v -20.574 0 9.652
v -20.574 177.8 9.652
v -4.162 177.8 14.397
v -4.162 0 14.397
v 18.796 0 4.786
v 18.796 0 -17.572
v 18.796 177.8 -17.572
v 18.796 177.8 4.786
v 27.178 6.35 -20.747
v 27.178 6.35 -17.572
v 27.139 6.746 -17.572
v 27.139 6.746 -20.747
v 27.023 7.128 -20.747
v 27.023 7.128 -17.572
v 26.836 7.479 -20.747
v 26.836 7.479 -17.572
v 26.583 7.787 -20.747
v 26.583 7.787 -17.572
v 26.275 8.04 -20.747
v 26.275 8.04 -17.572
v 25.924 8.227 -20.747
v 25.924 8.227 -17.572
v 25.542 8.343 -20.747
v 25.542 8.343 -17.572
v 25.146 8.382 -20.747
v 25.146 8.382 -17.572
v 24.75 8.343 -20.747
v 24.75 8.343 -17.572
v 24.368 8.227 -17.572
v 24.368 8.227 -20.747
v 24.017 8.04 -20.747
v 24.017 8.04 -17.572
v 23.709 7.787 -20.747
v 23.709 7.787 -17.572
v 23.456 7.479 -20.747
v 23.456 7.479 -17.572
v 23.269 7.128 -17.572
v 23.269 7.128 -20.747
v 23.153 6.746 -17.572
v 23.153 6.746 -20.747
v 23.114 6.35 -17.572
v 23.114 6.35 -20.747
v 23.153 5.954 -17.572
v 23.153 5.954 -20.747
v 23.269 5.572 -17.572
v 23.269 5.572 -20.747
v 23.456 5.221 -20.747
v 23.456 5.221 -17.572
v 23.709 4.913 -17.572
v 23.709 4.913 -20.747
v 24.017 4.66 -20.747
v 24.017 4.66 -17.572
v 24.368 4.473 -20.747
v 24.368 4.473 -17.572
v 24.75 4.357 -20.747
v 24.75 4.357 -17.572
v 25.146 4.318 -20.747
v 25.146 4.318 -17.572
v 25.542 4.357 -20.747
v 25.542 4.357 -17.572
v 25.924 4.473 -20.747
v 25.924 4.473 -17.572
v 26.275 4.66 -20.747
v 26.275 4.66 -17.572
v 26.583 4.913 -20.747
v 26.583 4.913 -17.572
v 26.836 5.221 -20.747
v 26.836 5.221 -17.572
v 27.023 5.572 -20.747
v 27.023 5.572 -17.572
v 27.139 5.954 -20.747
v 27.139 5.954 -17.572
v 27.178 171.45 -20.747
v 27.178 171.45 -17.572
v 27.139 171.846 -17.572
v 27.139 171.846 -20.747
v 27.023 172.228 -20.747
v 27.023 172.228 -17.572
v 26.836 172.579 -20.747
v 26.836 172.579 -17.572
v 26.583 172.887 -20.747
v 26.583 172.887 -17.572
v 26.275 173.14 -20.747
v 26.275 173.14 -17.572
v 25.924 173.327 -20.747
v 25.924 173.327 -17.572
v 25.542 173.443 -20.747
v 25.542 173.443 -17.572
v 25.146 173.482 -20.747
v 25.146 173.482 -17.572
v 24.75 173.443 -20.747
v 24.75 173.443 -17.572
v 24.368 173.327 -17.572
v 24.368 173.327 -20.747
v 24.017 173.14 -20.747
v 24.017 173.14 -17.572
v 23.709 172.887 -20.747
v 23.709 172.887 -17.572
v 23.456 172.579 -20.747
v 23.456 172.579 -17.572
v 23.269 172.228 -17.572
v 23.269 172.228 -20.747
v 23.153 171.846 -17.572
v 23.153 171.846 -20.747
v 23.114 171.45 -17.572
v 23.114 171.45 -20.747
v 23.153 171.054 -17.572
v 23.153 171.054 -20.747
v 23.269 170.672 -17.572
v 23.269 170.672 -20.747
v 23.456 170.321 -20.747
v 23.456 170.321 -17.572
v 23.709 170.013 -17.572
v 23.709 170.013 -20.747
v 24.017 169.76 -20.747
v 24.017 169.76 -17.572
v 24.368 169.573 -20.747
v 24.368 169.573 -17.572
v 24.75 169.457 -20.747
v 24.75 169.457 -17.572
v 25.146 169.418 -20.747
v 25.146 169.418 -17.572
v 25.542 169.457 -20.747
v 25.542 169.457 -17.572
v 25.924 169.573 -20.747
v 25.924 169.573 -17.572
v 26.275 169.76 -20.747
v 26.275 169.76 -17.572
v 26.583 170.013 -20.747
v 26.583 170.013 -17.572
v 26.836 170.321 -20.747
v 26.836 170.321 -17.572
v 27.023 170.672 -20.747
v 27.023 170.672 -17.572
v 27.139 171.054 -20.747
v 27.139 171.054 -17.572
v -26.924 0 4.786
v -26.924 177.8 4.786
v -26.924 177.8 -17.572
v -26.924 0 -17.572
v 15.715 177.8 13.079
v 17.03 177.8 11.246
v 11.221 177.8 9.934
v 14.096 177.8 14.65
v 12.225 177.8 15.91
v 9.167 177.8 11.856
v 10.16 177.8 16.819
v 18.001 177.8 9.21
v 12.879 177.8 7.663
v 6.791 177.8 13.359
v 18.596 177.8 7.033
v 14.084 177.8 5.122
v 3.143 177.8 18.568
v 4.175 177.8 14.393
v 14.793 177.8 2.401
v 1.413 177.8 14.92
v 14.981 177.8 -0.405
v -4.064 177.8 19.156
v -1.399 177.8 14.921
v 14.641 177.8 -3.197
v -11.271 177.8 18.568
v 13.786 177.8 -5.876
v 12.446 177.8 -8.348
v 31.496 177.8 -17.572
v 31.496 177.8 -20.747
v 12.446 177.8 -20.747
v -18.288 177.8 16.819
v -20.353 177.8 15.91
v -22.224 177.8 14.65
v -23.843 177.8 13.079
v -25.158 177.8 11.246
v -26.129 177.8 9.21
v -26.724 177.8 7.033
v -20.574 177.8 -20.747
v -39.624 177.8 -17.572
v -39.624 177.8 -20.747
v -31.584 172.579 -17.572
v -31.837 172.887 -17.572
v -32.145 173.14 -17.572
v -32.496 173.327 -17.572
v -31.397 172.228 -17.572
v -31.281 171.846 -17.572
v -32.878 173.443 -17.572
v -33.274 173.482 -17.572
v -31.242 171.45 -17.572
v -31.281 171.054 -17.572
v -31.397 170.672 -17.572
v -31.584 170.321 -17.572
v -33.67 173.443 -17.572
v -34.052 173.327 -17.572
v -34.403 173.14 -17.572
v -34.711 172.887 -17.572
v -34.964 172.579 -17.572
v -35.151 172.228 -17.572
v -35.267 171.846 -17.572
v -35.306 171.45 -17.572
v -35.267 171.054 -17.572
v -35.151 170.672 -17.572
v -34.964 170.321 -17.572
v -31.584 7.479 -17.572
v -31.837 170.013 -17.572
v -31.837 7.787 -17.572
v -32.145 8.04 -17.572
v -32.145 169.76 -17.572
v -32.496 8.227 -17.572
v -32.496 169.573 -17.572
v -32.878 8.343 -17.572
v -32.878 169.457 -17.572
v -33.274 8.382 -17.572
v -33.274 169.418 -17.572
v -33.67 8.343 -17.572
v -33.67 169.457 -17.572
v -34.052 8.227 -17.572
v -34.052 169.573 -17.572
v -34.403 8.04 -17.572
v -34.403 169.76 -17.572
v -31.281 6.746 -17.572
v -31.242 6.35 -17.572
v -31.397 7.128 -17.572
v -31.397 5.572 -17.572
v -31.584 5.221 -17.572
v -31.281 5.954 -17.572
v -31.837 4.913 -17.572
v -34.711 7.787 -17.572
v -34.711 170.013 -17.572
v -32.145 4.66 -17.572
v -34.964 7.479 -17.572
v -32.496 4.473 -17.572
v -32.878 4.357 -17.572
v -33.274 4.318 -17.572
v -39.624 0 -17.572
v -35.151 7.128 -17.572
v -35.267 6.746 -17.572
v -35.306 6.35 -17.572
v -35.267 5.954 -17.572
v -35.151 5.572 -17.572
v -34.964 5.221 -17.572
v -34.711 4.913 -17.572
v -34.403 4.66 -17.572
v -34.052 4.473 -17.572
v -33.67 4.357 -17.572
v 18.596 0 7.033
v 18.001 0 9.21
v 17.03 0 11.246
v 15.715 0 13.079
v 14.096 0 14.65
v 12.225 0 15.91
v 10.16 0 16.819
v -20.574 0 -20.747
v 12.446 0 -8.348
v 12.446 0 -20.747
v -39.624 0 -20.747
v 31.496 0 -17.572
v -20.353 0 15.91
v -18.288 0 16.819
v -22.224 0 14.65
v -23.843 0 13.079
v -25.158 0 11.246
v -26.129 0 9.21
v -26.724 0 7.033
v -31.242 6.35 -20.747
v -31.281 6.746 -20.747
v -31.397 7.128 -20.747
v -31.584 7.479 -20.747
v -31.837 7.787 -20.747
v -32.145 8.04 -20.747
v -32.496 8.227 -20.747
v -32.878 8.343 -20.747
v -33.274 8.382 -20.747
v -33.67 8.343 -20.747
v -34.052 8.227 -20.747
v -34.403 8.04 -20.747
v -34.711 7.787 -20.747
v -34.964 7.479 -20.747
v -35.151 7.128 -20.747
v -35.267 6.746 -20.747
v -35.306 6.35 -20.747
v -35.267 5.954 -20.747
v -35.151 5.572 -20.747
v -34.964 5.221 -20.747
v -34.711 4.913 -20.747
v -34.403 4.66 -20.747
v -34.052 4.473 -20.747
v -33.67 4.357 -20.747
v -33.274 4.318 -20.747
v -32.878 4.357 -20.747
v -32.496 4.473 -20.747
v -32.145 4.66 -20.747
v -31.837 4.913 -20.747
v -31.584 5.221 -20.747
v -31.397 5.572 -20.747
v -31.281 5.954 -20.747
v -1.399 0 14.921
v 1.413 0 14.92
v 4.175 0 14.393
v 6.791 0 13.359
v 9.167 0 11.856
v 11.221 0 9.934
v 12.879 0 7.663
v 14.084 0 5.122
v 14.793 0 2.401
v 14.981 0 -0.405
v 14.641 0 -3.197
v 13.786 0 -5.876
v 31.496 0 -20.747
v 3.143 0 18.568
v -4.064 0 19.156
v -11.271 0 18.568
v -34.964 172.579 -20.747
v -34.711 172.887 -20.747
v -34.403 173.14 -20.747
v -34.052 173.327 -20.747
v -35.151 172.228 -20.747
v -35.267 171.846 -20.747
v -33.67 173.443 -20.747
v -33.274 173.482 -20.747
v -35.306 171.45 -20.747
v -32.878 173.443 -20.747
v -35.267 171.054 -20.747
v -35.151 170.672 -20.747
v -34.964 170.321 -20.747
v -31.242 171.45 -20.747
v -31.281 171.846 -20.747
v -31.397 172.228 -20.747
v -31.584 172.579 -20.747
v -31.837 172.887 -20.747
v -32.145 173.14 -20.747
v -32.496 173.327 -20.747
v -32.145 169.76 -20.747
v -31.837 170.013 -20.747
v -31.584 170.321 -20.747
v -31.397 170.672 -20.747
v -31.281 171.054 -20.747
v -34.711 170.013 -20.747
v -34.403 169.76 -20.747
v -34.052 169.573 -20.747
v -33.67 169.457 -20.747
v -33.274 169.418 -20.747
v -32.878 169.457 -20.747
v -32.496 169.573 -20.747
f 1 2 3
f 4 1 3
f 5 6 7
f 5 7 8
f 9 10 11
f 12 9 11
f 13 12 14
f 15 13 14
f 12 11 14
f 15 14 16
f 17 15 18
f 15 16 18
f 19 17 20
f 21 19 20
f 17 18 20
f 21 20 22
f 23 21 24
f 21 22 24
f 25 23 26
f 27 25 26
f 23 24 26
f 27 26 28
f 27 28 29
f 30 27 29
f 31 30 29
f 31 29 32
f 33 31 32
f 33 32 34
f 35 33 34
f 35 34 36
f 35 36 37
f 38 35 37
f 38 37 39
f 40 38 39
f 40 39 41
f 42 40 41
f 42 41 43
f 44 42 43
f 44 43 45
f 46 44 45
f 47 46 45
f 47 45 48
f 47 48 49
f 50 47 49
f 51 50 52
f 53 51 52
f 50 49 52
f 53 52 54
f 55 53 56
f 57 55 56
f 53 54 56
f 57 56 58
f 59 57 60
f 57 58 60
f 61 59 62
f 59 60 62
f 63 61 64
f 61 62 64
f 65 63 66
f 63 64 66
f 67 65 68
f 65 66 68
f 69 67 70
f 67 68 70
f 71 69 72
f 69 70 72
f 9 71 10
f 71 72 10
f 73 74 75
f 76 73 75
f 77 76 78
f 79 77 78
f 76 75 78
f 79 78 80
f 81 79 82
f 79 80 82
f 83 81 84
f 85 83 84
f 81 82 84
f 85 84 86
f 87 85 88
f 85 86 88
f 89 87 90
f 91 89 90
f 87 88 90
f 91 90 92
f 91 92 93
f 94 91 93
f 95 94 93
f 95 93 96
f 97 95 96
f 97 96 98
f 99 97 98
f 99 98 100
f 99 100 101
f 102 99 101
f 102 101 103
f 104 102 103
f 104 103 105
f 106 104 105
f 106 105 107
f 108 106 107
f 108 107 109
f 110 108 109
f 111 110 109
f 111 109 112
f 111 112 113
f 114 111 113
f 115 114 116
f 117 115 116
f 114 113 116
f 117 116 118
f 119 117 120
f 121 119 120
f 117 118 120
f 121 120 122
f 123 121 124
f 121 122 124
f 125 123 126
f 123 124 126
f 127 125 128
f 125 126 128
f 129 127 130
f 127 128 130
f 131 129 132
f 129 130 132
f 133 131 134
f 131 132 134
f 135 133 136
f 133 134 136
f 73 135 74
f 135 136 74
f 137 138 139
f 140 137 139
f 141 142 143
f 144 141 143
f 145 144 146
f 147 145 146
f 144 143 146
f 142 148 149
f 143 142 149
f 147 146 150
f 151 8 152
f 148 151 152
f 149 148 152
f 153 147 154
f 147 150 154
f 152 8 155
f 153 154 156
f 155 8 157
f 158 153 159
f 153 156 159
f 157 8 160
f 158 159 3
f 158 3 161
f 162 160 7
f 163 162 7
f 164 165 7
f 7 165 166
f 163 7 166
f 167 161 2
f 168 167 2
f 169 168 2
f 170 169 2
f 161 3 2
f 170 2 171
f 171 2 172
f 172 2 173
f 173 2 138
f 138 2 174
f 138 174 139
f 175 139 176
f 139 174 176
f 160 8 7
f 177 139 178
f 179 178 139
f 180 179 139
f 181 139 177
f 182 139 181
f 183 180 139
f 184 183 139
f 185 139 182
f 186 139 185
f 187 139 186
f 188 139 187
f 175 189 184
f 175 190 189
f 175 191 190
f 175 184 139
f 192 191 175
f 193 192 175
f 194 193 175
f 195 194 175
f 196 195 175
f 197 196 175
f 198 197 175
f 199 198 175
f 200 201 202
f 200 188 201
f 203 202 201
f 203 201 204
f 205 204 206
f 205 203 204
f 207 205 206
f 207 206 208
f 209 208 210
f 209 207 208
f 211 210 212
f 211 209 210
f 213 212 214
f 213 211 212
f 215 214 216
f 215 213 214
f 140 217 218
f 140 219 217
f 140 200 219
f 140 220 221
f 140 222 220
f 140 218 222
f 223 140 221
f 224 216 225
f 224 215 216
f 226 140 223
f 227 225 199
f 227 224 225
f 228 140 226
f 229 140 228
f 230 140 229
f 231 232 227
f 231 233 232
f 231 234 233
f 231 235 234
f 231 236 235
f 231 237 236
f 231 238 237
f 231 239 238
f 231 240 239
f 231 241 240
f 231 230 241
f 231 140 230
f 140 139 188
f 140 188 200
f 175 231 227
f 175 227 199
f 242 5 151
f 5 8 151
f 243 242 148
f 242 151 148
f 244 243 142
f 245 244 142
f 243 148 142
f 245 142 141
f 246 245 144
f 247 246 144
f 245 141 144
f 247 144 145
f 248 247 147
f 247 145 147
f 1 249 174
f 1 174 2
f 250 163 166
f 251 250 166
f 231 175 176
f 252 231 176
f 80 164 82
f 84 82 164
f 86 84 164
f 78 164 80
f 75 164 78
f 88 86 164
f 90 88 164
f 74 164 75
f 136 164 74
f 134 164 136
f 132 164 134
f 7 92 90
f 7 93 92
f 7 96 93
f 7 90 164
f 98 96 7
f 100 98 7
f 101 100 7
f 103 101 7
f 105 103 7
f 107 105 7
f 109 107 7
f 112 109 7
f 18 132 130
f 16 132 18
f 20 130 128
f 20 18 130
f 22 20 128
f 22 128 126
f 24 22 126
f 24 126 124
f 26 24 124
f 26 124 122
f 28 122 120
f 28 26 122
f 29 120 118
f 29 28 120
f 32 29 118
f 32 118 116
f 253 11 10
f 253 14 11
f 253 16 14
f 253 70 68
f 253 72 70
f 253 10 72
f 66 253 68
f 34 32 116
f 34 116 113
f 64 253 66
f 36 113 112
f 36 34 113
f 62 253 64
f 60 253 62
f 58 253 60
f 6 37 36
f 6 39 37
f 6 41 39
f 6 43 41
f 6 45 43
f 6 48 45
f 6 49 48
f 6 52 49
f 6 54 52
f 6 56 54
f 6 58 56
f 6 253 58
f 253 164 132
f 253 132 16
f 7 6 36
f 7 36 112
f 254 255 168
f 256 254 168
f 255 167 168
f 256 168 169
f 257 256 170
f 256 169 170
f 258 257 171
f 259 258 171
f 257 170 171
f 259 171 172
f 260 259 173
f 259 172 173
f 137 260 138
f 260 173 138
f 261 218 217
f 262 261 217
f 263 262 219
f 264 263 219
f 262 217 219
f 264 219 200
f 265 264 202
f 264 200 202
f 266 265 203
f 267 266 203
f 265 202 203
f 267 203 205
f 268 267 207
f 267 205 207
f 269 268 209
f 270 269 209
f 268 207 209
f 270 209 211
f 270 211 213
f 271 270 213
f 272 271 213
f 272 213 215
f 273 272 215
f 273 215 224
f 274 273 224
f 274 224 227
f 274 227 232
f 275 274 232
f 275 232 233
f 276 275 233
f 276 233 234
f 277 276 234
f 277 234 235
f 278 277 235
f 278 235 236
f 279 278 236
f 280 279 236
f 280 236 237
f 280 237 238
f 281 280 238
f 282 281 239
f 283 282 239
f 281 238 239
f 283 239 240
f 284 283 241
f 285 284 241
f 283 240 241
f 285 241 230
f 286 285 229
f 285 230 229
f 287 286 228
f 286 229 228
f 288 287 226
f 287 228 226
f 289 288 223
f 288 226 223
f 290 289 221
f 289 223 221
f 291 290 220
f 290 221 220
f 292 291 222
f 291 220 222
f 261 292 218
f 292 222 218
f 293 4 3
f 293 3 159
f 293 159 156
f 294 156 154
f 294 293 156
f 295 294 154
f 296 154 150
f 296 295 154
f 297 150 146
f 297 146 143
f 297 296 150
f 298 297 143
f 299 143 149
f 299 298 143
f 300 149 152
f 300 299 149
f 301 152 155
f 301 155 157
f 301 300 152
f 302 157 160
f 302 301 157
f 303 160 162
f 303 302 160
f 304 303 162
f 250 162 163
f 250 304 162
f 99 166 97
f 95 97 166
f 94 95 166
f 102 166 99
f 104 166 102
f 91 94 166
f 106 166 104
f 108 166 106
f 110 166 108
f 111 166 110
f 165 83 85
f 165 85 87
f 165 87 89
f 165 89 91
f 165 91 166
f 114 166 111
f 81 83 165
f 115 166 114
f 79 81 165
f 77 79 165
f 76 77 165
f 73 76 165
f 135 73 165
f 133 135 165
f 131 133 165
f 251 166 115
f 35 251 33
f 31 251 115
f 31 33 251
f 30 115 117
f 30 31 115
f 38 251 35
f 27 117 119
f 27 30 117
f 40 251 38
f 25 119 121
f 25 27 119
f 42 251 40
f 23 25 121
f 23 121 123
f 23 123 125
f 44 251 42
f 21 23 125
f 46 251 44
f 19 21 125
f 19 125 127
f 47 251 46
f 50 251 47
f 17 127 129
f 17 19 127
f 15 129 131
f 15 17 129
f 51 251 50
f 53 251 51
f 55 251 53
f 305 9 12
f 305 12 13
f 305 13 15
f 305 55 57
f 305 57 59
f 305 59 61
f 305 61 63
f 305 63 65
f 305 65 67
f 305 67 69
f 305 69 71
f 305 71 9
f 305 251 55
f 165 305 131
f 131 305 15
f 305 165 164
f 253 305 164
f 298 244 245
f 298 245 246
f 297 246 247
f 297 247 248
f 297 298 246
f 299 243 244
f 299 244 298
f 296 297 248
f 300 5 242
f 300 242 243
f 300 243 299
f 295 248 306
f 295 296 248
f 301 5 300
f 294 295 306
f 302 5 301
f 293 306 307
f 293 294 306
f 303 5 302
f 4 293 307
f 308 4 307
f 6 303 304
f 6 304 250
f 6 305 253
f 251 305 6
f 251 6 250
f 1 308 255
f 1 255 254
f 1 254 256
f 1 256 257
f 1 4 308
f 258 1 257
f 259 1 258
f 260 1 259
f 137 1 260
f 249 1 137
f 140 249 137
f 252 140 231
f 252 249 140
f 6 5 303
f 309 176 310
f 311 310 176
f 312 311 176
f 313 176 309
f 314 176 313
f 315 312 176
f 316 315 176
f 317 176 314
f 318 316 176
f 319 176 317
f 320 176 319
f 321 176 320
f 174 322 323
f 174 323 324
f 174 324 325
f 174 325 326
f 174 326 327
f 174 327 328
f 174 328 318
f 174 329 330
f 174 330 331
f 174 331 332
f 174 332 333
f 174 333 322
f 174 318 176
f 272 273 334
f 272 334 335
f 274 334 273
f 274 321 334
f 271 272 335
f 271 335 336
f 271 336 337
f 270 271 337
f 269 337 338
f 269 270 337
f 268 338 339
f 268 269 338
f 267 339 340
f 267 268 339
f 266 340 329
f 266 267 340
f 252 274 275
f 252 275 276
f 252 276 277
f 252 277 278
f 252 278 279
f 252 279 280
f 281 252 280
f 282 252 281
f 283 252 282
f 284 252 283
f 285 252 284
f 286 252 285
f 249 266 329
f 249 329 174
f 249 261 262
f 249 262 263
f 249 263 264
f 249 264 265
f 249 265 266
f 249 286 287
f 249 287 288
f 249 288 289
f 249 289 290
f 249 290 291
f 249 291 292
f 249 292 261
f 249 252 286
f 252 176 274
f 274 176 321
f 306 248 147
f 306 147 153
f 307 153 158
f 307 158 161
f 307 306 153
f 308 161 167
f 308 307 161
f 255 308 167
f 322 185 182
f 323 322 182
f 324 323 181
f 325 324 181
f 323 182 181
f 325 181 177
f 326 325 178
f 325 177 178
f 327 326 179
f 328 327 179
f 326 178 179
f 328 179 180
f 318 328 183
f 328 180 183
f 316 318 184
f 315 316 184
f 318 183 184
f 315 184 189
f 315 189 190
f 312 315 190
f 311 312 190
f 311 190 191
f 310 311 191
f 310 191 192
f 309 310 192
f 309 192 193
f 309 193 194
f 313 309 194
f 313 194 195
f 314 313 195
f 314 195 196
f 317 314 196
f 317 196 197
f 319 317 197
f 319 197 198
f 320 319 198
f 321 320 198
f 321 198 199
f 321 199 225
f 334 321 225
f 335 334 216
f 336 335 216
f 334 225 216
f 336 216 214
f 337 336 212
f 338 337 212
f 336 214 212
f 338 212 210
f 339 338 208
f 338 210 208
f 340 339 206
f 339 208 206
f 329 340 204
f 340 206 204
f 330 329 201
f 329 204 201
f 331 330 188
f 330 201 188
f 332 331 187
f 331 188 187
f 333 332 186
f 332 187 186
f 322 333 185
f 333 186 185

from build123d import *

# Parameters (mm, degrees)
BOSS_EXTRUDE1_DEPTH = 177.8
SKETCH2_R           = 2.032
CUT_EXTRUDE1_DEPTH  = 186.827403736
FILLET2_R           = 12.7


with BuildPart() as part:
    # Sketch1 → Boss-Extrude1 (new body)
    with BuildSketch(Plane(origin=(0, 0, 0), x_dir=(1, 0, 0), z_dir=(0, 1, 0))):
        with BuildLine():
            Line((-20.574, -9.652129604), (-4.162019583, -14.39674322))
            ThreePointArc((-4.162019583, -14.39674322), (12.103082443, -8.837647749), (12.446, 8.347796497))
            Line((12.446, 8.347796497), (12.446, 20.746712887))
            Line((12.446, 20.746712887), (31.496, 20.746712887))
            Line((31.496, 20.746712887), (31.496, 17.571712887))
            Line((31.496, 17.571712887), (18.796, 17.571712887))
            Line((18.796, 17.571712887), (18.796, -12.827129604))
            ThreePointArc((18.796, -12.827129604), (-4.064, -19.155968814), (-26.924, -12.827129604))
            Line((-26.924, -12.827129604), (-26.924, 17.571712887))
            Line((-26.924, 17.571712887), (-39.624, 17.571712887))
            Line((-39.624, 17.571712887), (-39.624, 20.746712887))
            Line((-39.624, 20.746712887), (-20.574, 20.746712887))
            Line((-20.574, 20.746712887), (-20.574, 9.652))
            Line((-20.574, 9.652), (-20.574, -9.652129604))
        make_face()
    extrude(amount=BOSS_EXTRUDE1_DEPTH)

    # Sketch2 → Cut-Extrude1 (cut, through all)
    with BuildSketch(Plane.XY.offset(-17.571712887)):
        with Locations((-33.274, 171.45)):
            Circle(SKETCH2_R)
        with Locations((-33.274, 6.35)):
            Circle(SKETCH2_R)
        with Locations((25.146, 171.45)):
            Circle(SKETCH2_R)
        with Locations((25.146, 6.35)):
            Circle(SKETCH2_R)
    extrude(amount=-CUT_EXTRUDE1_DEPTH, mode=Mode.SUBTRACT)

    # Fillet2
    fillet2_edges = [part.edges().sort_by_distance(p)[0] for p in [
        (18.796, 88.9, 12.827129604),
        (-26.924, 88.9, 12.827129604),
    ]]
    fillet(fillet2_edges, radius=FILLET2_R)


solid = part.part
